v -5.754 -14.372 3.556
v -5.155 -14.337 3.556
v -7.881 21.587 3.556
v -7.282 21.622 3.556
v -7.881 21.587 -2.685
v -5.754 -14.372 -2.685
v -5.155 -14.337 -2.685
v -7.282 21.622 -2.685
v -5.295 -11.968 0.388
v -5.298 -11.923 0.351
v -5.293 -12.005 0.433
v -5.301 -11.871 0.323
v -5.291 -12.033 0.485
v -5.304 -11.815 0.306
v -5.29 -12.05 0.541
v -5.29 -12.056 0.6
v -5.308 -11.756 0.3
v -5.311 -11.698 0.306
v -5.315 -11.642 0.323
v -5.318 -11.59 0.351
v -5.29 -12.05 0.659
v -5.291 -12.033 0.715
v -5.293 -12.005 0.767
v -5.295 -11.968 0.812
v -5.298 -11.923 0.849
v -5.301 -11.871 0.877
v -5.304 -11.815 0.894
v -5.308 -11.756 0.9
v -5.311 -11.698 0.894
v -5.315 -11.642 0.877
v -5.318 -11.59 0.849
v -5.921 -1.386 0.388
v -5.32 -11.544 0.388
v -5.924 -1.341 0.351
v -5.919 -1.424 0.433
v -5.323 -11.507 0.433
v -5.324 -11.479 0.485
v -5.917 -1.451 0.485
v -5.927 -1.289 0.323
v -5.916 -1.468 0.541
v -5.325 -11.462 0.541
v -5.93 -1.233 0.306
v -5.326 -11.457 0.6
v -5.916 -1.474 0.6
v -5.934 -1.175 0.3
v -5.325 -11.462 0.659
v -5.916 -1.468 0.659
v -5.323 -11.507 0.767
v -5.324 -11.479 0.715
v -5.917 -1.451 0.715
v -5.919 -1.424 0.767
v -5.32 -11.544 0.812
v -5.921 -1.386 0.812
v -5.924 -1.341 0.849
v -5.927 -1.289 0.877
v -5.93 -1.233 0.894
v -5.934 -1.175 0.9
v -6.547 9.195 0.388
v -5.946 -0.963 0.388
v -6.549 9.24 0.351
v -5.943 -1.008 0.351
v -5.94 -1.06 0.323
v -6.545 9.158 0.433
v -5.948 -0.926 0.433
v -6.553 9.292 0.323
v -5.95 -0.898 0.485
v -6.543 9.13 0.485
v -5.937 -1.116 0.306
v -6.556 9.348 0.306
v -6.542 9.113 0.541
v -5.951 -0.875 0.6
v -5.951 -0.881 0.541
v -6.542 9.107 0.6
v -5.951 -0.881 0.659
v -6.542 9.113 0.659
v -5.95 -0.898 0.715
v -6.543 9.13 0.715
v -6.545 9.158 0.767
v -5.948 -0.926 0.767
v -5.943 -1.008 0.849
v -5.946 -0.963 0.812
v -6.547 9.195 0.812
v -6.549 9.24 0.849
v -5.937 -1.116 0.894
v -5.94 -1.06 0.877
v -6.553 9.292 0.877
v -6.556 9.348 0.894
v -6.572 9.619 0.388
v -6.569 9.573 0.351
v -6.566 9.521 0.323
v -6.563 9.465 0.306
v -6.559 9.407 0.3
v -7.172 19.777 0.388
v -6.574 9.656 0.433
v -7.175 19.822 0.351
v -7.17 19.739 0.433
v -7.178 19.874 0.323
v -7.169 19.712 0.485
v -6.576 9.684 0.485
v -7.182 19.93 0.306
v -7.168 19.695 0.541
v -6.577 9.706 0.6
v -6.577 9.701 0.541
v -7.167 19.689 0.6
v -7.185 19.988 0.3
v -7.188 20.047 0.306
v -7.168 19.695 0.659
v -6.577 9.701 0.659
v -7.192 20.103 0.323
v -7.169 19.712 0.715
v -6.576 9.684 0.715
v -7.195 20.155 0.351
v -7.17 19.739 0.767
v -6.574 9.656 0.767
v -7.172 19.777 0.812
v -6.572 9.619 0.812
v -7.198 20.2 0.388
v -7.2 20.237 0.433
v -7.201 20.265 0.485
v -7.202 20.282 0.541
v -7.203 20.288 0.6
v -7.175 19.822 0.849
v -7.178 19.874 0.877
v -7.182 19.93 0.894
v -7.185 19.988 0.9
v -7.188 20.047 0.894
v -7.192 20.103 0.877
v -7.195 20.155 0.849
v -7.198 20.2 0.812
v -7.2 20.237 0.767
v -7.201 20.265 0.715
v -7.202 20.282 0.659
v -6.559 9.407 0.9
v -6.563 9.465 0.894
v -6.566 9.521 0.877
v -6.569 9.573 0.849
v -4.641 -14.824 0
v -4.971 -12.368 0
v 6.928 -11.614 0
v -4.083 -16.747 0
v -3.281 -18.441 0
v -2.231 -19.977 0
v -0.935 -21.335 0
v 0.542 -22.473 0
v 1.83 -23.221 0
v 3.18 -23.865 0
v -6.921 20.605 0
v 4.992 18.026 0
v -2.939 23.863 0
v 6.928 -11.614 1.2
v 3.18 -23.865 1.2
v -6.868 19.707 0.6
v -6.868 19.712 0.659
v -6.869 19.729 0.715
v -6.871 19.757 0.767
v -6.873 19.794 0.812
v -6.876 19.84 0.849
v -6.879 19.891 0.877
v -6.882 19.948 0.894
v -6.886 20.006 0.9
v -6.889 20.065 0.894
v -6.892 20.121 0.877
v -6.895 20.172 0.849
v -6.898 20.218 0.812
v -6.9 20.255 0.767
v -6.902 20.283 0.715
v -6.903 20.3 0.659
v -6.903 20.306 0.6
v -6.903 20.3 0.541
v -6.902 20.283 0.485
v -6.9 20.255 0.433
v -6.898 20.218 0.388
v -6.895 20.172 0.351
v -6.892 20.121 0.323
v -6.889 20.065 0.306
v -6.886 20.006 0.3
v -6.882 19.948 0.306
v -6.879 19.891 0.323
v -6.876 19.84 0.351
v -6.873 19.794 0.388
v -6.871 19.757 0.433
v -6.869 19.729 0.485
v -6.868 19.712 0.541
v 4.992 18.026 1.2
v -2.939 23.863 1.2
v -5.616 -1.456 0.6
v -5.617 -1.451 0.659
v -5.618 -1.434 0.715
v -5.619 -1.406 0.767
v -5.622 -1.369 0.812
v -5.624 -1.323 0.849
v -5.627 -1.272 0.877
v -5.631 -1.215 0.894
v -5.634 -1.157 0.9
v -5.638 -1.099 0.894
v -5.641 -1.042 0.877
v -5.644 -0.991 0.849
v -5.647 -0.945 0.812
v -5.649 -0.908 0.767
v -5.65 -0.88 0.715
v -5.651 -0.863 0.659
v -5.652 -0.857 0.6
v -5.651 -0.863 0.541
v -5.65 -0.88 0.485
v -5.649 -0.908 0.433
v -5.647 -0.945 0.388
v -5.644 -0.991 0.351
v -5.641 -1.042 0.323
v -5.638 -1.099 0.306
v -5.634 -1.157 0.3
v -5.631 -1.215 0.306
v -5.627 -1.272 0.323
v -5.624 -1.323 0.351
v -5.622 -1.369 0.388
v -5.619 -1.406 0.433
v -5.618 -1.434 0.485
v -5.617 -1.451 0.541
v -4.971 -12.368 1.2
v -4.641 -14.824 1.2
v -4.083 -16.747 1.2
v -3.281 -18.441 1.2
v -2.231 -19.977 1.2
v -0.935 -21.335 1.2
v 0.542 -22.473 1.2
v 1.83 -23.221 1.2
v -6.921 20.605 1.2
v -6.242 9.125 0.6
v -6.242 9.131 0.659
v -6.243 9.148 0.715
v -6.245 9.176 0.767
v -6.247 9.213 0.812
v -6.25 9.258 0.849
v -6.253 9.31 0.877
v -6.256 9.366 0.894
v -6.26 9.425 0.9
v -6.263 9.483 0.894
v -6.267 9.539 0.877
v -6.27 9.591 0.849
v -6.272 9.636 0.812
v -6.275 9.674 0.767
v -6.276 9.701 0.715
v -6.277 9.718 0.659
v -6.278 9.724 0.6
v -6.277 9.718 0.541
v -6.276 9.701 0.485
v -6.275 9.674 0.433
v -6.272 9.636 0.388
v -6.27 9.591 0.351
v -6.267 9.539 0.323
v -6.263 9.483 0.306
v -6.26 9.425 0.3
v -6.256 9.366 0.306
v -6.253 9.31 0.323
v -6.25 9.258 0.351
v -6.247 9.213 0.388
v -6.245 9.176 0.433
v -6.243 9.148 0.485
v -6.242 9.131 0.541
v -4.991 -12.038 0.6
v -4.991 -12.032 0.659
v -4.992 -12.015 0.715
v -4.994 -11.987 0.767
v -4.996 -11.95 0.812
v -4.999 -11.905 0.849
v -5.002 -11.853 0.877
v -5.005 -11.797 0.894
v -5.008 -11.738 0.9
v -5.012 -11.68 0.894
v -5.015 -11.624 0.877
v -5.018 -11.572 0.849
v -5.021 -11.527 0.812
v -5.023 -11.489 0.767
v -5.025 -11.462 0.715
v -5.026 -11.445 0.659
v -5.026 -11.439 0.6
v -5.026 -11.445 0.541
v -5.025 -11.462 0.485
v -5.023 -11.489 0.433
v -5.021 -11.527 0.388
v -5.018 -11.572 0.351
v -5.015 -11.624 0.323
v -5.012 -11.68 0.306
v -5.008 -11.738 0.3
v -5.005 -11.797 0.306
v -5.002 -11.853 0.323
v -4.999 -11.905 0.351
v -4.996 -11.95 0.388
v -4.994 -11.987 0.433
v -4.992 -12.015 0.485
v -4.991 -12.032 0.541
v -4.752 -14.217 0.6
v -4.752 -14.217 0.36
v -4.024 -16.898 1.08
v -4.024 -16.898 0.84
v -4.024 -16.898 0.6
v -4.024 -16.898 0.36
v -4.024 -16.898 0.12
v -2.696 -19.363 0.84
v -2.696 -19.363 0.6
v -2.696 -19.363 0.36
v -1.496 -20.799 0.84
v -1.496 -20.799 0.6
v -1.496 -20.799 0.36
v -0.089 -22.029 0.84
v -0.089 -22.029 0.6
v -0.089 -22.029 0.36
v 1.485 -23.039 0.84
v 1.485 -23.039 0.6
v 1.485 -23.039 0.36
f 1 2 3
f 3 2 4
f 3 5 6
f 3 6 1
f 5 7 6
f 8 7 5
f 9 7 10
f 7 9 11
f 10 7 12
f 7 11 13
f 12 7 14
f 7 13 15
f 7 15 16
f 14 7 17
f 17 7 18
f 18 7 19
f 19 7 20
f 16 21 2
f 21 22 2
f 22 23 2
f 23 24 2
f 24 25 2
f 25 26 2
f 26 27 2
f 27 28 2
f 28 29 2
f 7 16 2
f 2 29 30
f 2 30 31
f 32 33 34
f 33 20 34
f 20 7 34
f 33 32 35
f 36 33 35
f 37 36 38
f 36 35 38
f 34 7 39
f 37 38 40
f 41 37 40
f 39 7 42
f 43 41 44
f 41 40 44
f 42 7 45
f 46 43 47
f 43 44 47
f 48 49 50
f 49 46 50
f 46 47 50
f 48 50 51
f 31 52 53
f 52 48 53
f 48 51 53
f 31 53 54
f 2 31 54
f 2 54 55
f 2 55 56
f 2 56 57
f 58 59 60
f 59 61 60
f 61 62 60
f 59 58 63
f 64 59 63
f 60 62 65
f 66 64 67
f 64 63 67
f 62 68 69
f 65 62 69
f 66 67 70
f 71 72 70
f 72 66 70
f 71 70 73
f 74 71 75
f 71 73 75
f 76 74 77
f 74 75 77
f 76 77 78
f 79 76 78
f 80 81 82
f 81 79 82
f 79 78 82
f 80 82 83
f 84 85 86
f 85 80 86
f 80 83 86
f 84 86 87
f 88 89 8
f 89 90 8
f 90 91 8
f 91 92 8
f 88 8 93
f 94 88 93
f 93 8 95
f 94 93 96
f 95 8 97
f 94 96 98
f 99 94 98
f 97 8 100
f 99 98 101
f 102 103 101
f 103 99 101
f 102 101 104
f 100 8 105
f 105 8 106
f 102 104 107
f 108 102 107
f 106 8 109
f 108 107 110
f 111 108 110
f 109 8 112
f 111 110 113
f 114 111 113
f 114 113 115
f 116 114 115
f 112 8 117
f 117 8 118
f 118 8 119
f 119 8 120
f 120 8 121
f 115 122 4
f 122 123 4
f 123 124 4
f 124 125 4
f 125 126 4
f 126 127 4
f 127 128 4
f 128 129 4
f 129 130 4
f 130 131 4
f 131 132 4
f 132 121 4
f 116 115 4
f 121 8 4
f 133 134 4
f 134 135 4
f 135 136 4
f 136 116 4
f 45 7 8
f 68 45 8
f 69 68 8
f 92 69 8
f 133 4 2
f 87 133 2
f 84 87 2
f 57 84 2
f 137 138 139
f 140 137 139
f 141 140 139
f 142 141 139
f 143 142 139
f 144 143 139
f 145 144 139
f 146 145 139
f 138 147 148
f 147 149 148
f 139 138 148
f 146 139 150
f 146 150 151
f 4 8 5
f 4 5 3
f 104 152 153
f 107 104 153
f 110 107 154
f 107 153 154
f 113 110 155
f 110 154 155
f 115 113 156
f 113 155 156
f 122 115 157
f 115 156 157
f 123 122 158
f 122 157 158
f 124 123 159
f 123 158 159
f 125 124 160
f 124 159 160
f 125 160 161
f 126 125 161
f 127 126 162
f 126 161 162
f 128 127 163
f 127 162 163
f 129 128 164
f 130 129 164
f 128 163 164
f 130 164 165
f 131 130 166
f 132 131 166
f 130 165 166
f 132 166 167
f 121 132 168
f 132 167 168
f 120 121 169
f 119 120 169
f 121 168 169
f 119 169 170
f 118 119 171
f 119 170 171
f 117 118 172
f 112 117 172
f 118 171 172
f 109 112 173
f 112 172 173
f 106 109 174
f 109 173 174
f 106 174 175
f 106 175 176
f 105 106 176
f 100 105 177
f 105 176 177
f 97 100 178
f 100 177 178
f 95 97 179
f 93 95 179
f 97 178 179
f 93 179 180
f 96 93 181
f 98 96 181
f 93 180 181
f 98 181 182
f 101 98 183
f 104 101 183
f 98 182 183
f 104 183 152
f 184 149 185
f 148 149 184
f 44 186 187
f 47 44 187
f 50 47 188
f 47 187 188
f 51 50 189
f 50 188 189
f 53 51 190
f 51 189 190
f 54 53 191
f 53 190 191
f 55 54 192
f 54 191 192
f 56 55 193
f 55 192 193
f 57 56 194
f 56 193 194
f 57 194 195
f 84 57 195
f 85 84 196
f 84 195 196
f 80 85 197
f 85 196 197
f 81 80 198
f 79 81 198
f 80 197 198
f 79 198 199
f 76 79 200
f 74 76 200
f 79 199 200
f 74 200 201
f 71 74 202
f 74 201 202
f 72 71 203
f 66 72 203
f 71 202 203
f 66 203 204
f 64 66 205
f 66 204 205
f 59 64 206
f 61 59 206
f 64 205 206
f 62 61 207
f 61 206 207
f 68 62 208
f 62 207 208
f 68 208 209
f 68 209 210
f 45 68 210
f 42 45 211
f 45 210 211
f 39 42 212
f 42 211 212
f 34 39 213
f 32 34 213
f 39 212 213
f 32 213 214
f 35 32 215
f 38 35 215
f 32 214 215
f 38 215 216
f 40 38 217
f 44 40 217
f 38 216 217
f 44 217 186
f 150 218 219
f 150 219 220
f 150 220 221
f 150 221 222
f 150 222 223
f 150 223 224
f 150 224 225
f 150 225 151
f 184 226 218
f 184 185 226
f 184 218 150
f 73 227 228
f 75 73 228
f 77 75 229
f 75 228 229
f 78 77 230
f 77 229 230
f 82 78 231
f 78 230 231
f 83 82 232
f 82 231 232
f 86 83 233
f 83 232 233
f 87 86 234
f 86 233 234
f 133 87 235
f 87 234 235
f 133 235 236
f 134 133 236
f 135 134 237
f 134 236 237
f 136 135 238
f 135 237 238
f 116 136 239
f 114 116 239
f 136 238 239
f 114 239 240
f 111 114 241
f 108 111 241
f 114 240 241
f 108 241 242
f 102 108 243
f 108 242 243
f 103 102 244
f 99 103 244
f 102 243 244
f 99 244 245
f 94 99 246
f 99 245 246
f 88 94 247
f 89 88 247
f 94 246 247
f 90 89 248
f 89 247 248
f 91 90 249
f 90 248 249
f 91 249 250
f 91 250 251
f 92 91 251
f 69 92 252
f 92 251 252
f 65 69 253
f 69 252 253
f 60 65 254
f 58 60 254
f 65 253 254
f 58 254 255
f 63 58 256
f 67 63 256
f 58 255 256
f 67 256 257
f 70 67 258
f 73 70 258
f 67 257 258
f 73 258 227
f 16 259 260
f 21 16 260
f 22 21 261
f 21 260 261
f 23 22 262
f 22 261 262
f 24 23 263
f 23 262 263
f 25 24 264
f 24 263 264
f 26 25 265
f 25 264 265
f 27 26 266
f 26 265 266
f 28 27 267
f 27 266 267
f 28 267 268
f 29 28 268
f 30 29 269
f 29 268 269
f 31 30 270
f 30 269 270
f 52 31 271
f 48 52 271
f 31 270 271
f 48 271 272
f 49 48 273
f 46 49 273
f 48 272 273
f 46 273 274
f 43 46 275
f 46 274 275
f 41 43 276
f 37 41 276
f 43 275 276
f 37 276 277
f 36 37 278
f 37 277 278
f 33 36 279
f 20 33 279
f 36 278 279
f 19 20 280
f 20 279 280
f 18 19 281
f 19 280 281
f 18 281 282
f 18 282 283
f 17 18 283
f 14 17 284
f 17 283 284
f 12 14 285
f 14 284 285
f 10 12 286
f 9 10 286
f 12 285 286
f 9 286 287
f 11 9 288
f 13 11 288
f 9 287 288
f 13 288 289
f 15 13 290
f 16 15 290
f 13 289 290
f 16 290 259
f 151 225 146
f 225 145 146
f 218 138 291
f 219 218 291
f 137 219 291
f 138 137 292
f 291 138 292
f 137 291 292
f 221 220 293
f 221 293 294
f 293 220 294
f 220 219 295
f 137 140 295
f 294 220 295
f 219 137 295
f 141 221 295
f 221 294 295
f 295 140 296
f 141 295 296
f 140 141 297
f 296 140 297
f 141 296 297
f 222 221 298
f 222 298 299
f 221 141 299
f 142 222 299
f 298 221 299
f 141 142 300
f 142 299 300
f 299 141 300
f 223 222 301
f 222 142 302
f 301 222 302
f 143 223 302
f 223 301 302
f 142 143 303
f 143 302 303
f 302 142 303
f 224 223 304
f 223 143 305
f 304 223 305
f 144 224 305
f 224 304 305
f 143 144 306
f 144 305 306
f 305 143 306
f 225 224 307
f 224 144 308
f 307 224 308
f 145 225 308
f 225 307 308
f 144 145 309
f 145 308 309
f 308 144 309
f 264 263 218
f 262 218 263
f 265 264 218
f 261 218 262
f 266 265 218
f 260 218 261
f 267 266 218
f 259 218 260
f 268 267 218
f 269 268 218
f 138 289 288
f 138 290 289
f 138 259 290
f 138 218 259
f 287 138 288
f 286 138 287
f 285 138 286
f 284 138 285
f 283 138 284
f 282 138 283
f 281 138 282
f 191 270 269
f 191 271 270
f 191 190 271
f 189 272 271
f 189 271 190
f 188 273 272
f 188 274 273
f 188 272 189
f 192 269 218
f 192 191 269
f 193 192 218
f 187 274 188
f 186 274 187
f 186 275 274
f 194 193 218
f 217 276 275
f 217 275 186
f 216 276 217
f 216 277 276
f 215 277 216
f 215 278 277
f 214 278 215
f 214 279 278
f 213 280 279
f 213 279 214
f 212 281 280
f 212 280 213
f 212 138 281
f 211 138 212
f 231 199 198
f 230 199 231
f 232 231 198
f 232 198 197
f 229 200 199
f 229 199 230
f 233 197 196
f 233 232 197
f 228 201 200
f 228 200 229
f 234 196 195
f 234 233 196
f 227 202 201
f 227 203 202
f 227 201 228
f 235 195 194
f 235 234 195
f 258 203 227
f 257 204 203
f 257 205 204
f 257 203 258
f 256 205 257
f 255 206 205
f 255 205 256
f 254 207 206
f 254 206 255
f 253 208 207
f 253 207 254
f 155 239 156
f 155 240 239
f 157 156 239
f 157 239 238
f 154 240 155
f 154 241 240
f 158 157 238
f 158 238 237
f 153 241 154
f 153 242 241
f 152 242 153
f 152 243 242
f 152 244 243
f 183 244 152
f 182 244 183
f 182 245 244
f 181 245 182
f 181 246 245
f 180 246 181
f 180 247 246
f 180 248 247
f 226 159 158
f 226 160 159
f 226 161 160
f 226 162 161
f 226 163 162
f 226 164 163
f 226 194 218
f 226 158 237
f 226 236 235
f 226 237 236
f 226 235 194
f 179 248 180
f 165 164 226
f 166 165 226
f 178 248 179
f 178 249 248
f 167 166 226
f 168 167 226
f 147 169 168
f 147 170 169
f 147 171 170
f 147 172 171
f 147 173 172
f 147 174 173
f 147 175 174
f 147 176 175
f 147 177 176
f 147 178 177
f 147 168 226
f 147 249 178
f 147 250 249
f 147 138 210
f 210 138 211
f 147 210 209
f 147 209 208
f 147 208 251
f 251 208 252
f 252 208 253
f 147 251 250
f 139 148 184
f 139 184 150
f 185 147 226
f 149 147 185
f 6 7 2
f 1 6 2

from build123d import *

# Parameters (mm, degrees)
EXTRUDE_1_DEPTH     = 1.2
CUT_EXTRUDE_START   = -1.2
CUT_EXTRUDE_1_DEPTH = 1.2
SKETCH_3_R          = 0.3
EXTRUDE_2_DEPTH     = 0.3
SKETCH_4_W          = 6.240890377
SKETCH_4_H          = 36.021981299
EXTRUDE_3_DEPTH     = 0.6


# Read off the part's stored shape, not the designer's step: Вырез-Вытянуть-Тонкостенный1
with BuildPart() as part:
    # Эскиз1 → Бобышка-Вытянуть1 (new body)
    with BuildSketch(Plane.XY):
        with BuildLine():
            Line((5.378881308, 18.237319105), (-2.952136628, 24.369097407))
            Line((-2.952136628, 24.369097407), (-7.332317287, 20.785313231))
            Line((-7.332317287, 20.785313231), (-5.370009146, -12.399066019))
            add(Edge.make_bspline(
                [(-5.370009146, -12.399066019), (-5.302441643, -13.087933403), (-5.171652717, -14.4213588), (-4.705894041, -16.337224351), (-3.980118415, -18.073869331), (-3.037863831, -19.656891462), (-1.854751161, -21.069611208), (-0.442865037, -22.322015124), (1.210414163, -23.402243504), (2.432125444, -23.961998582), (3.062087221, -24.250630037)],
                knots=[0, 0, 0, 0, 0.134544415, 0.260434655, 0.381864625, 0.499402401, 0.617479097, 0.738843694, 0.865337667, 1, 1, 1, 1], degree=3))
            Line((3.062087221, -24.250630037), (3.44414449, -24.369097407))
            Line((3.44414449, -24.369097407), (7.332317287, -11.660532618))
            Line((7.332317287, -11.660532618), (5.378881308, 18.237319105))
        make_face()
    extrude(amount=EXTRUDE_1_DEPTH)

    # Вырез-Вытянуть-Тонкостенный1 outline → Вырез-Вытянуть-Тонкостенный1 (cut)
    with BuildSketch(Plane.XY.offset(1.2).offset(CUT_EXTRUDE_START)):
        with BuildLine():
            Line((-7.332317287, 20.785313231), (-5.370009146, -12.399066019))
            add(Edge.make_bspline(
                [(-5.370009146, -12.399066019), (-5.302441643, -13.087933403), (-5.171652717, -14.4213588), (-4.705894041, -16.337224351), (-3.980118415, -18.073869331), (-3.037863831, -19.656891462), (-1.854751161, -21.069611208), (-0.442865037, -22.322015124), (1.210414163, -23.402243504), (2.432125444, -23.961998582), (3.062087221, -24.250630037)],
                knots=[0, 0, 0, 0, 0.134544415, 0.260434655, 0.381864625, 0.499402401, 0.617479097, 0.738843694, 0.865337667, 1, 1, 1, 1], degree=3))
            Line((3.062087221, -24.250630037), (3.44414449, -24.369097407))
            Line((3.44414449, -24.369097407), (7.332317287, -11.660532618))
            Line((7.332317287, -11.660532618), (5.378881308, 18.237319105))
            Line((5.378881308, 18.237319105), (-2.952136628, 24.369097407))
            Line((-2.952136628, 24.369097407), (-7.332317287, 20.785313231))
        make_face()
        with BuildLine():
            add(Edge.make_bspline(
                [(-4.971163716, -12.367724843), (-4.910437592, -12.986836229), (-4.849676357, -13.605939574), (-4.654543085, -14.827292297), (-4.518019632, -15.429049084), (-4.24283568, -16.315565722), (-4.139152476, -16.608333995), (-3.907848144, -17.188389699), (-3.77968372, -17.476760574), (-3.366686296, -18.319539943), (-3.053087929, -18.855873767), (-2.517467922, -19.616879364), (-2.327928668, -19.863212785), (-1.927678486, -20.341760794), (-1.716167659, -20.574779068), (-1.056114397, -21.24716639), (-0.586382585, -21.656301106), (0.408094083, -22.402093404), (0.932873325, -22.738705687), (2.037021143, -23.34001134), (2.608653164, -23.602856812), (3.180150897, -23.864736725)],
                knots=[0, 0, 0, 0, 0.125, 0.125, 0.25, 0.25, 0.3125, 0.3125, 0.375, 0.375, 0.5, 0.5, 0.5625, 0.5625, 0.625, 0.625, 0.75, 0.75, 0.875, 0.875, 1, 1, 1, 1], degree=3))
            Line((-4.971163716, -12.367724843), (-6.920959218, 20.605054546))
            Line((-6.920959218, 20.605054546), (-2.939165367, 23.862885878))
            Line((-2.939165367, 23.862885878), (4.991867828, 18.025503503))
            Line((4.991867828, 18.025503503), (6.928393761, -11.61353551))
            Line((6.928393761, -11.61353551), (3.180150897, -23.864736725))
        make_face(mode=Mode.SUBTRACT)
    extrude(amount=CUT_EXTRUDE_1_DEPTH, mode=Mode.SUBTRACT)

    # Эскиз3 → Бобышка-Вытянуть2 (add)
    with BuildSketch(Plane(origin=(-5.682639561, -0.336034307, 0), x_dir=(0, 0, 1), z_dir=(-0.9982561871654927, -0.059030371723486505, 0))):
        with Locations(Location((0.6, 20.377669982, 0), (0, 0, 270))):
            Circle(SKETCH_3_R)
        with Locations(Location((0.6, 9.777669982, 0), (0, 0, 270))):
            Circle(SKETCH_3_R)
        with Locations(Location((0.6, -0.822330018, 0), (0, 0, 270))):
            Circle(SKETCH_3_R)
        with Locations(Location((0.6, -11.422330018, 0), (0, 0, 270))):
            Circle(SKETCH_3_R)
    extrude(amount=EXTRUDE_2_DEPTH)

    # Эскиз4 → Бобышка-Вытянуть3 (add)
    with BuildSketch(Plane(origin=(-5.982116417, -0.353743418, 0), x_dir=(0, 0, 1), z_dir=(-0.9982561871654927, -0.05903037172348652, 0))):
        with Locations((0.435766043, 4.003532813)):
            Rectangle(SKETCH_4_W, SKETCH_4_H)
    extrude(amount=EXTRUDE_3_DEPTH)


solid = part.part
